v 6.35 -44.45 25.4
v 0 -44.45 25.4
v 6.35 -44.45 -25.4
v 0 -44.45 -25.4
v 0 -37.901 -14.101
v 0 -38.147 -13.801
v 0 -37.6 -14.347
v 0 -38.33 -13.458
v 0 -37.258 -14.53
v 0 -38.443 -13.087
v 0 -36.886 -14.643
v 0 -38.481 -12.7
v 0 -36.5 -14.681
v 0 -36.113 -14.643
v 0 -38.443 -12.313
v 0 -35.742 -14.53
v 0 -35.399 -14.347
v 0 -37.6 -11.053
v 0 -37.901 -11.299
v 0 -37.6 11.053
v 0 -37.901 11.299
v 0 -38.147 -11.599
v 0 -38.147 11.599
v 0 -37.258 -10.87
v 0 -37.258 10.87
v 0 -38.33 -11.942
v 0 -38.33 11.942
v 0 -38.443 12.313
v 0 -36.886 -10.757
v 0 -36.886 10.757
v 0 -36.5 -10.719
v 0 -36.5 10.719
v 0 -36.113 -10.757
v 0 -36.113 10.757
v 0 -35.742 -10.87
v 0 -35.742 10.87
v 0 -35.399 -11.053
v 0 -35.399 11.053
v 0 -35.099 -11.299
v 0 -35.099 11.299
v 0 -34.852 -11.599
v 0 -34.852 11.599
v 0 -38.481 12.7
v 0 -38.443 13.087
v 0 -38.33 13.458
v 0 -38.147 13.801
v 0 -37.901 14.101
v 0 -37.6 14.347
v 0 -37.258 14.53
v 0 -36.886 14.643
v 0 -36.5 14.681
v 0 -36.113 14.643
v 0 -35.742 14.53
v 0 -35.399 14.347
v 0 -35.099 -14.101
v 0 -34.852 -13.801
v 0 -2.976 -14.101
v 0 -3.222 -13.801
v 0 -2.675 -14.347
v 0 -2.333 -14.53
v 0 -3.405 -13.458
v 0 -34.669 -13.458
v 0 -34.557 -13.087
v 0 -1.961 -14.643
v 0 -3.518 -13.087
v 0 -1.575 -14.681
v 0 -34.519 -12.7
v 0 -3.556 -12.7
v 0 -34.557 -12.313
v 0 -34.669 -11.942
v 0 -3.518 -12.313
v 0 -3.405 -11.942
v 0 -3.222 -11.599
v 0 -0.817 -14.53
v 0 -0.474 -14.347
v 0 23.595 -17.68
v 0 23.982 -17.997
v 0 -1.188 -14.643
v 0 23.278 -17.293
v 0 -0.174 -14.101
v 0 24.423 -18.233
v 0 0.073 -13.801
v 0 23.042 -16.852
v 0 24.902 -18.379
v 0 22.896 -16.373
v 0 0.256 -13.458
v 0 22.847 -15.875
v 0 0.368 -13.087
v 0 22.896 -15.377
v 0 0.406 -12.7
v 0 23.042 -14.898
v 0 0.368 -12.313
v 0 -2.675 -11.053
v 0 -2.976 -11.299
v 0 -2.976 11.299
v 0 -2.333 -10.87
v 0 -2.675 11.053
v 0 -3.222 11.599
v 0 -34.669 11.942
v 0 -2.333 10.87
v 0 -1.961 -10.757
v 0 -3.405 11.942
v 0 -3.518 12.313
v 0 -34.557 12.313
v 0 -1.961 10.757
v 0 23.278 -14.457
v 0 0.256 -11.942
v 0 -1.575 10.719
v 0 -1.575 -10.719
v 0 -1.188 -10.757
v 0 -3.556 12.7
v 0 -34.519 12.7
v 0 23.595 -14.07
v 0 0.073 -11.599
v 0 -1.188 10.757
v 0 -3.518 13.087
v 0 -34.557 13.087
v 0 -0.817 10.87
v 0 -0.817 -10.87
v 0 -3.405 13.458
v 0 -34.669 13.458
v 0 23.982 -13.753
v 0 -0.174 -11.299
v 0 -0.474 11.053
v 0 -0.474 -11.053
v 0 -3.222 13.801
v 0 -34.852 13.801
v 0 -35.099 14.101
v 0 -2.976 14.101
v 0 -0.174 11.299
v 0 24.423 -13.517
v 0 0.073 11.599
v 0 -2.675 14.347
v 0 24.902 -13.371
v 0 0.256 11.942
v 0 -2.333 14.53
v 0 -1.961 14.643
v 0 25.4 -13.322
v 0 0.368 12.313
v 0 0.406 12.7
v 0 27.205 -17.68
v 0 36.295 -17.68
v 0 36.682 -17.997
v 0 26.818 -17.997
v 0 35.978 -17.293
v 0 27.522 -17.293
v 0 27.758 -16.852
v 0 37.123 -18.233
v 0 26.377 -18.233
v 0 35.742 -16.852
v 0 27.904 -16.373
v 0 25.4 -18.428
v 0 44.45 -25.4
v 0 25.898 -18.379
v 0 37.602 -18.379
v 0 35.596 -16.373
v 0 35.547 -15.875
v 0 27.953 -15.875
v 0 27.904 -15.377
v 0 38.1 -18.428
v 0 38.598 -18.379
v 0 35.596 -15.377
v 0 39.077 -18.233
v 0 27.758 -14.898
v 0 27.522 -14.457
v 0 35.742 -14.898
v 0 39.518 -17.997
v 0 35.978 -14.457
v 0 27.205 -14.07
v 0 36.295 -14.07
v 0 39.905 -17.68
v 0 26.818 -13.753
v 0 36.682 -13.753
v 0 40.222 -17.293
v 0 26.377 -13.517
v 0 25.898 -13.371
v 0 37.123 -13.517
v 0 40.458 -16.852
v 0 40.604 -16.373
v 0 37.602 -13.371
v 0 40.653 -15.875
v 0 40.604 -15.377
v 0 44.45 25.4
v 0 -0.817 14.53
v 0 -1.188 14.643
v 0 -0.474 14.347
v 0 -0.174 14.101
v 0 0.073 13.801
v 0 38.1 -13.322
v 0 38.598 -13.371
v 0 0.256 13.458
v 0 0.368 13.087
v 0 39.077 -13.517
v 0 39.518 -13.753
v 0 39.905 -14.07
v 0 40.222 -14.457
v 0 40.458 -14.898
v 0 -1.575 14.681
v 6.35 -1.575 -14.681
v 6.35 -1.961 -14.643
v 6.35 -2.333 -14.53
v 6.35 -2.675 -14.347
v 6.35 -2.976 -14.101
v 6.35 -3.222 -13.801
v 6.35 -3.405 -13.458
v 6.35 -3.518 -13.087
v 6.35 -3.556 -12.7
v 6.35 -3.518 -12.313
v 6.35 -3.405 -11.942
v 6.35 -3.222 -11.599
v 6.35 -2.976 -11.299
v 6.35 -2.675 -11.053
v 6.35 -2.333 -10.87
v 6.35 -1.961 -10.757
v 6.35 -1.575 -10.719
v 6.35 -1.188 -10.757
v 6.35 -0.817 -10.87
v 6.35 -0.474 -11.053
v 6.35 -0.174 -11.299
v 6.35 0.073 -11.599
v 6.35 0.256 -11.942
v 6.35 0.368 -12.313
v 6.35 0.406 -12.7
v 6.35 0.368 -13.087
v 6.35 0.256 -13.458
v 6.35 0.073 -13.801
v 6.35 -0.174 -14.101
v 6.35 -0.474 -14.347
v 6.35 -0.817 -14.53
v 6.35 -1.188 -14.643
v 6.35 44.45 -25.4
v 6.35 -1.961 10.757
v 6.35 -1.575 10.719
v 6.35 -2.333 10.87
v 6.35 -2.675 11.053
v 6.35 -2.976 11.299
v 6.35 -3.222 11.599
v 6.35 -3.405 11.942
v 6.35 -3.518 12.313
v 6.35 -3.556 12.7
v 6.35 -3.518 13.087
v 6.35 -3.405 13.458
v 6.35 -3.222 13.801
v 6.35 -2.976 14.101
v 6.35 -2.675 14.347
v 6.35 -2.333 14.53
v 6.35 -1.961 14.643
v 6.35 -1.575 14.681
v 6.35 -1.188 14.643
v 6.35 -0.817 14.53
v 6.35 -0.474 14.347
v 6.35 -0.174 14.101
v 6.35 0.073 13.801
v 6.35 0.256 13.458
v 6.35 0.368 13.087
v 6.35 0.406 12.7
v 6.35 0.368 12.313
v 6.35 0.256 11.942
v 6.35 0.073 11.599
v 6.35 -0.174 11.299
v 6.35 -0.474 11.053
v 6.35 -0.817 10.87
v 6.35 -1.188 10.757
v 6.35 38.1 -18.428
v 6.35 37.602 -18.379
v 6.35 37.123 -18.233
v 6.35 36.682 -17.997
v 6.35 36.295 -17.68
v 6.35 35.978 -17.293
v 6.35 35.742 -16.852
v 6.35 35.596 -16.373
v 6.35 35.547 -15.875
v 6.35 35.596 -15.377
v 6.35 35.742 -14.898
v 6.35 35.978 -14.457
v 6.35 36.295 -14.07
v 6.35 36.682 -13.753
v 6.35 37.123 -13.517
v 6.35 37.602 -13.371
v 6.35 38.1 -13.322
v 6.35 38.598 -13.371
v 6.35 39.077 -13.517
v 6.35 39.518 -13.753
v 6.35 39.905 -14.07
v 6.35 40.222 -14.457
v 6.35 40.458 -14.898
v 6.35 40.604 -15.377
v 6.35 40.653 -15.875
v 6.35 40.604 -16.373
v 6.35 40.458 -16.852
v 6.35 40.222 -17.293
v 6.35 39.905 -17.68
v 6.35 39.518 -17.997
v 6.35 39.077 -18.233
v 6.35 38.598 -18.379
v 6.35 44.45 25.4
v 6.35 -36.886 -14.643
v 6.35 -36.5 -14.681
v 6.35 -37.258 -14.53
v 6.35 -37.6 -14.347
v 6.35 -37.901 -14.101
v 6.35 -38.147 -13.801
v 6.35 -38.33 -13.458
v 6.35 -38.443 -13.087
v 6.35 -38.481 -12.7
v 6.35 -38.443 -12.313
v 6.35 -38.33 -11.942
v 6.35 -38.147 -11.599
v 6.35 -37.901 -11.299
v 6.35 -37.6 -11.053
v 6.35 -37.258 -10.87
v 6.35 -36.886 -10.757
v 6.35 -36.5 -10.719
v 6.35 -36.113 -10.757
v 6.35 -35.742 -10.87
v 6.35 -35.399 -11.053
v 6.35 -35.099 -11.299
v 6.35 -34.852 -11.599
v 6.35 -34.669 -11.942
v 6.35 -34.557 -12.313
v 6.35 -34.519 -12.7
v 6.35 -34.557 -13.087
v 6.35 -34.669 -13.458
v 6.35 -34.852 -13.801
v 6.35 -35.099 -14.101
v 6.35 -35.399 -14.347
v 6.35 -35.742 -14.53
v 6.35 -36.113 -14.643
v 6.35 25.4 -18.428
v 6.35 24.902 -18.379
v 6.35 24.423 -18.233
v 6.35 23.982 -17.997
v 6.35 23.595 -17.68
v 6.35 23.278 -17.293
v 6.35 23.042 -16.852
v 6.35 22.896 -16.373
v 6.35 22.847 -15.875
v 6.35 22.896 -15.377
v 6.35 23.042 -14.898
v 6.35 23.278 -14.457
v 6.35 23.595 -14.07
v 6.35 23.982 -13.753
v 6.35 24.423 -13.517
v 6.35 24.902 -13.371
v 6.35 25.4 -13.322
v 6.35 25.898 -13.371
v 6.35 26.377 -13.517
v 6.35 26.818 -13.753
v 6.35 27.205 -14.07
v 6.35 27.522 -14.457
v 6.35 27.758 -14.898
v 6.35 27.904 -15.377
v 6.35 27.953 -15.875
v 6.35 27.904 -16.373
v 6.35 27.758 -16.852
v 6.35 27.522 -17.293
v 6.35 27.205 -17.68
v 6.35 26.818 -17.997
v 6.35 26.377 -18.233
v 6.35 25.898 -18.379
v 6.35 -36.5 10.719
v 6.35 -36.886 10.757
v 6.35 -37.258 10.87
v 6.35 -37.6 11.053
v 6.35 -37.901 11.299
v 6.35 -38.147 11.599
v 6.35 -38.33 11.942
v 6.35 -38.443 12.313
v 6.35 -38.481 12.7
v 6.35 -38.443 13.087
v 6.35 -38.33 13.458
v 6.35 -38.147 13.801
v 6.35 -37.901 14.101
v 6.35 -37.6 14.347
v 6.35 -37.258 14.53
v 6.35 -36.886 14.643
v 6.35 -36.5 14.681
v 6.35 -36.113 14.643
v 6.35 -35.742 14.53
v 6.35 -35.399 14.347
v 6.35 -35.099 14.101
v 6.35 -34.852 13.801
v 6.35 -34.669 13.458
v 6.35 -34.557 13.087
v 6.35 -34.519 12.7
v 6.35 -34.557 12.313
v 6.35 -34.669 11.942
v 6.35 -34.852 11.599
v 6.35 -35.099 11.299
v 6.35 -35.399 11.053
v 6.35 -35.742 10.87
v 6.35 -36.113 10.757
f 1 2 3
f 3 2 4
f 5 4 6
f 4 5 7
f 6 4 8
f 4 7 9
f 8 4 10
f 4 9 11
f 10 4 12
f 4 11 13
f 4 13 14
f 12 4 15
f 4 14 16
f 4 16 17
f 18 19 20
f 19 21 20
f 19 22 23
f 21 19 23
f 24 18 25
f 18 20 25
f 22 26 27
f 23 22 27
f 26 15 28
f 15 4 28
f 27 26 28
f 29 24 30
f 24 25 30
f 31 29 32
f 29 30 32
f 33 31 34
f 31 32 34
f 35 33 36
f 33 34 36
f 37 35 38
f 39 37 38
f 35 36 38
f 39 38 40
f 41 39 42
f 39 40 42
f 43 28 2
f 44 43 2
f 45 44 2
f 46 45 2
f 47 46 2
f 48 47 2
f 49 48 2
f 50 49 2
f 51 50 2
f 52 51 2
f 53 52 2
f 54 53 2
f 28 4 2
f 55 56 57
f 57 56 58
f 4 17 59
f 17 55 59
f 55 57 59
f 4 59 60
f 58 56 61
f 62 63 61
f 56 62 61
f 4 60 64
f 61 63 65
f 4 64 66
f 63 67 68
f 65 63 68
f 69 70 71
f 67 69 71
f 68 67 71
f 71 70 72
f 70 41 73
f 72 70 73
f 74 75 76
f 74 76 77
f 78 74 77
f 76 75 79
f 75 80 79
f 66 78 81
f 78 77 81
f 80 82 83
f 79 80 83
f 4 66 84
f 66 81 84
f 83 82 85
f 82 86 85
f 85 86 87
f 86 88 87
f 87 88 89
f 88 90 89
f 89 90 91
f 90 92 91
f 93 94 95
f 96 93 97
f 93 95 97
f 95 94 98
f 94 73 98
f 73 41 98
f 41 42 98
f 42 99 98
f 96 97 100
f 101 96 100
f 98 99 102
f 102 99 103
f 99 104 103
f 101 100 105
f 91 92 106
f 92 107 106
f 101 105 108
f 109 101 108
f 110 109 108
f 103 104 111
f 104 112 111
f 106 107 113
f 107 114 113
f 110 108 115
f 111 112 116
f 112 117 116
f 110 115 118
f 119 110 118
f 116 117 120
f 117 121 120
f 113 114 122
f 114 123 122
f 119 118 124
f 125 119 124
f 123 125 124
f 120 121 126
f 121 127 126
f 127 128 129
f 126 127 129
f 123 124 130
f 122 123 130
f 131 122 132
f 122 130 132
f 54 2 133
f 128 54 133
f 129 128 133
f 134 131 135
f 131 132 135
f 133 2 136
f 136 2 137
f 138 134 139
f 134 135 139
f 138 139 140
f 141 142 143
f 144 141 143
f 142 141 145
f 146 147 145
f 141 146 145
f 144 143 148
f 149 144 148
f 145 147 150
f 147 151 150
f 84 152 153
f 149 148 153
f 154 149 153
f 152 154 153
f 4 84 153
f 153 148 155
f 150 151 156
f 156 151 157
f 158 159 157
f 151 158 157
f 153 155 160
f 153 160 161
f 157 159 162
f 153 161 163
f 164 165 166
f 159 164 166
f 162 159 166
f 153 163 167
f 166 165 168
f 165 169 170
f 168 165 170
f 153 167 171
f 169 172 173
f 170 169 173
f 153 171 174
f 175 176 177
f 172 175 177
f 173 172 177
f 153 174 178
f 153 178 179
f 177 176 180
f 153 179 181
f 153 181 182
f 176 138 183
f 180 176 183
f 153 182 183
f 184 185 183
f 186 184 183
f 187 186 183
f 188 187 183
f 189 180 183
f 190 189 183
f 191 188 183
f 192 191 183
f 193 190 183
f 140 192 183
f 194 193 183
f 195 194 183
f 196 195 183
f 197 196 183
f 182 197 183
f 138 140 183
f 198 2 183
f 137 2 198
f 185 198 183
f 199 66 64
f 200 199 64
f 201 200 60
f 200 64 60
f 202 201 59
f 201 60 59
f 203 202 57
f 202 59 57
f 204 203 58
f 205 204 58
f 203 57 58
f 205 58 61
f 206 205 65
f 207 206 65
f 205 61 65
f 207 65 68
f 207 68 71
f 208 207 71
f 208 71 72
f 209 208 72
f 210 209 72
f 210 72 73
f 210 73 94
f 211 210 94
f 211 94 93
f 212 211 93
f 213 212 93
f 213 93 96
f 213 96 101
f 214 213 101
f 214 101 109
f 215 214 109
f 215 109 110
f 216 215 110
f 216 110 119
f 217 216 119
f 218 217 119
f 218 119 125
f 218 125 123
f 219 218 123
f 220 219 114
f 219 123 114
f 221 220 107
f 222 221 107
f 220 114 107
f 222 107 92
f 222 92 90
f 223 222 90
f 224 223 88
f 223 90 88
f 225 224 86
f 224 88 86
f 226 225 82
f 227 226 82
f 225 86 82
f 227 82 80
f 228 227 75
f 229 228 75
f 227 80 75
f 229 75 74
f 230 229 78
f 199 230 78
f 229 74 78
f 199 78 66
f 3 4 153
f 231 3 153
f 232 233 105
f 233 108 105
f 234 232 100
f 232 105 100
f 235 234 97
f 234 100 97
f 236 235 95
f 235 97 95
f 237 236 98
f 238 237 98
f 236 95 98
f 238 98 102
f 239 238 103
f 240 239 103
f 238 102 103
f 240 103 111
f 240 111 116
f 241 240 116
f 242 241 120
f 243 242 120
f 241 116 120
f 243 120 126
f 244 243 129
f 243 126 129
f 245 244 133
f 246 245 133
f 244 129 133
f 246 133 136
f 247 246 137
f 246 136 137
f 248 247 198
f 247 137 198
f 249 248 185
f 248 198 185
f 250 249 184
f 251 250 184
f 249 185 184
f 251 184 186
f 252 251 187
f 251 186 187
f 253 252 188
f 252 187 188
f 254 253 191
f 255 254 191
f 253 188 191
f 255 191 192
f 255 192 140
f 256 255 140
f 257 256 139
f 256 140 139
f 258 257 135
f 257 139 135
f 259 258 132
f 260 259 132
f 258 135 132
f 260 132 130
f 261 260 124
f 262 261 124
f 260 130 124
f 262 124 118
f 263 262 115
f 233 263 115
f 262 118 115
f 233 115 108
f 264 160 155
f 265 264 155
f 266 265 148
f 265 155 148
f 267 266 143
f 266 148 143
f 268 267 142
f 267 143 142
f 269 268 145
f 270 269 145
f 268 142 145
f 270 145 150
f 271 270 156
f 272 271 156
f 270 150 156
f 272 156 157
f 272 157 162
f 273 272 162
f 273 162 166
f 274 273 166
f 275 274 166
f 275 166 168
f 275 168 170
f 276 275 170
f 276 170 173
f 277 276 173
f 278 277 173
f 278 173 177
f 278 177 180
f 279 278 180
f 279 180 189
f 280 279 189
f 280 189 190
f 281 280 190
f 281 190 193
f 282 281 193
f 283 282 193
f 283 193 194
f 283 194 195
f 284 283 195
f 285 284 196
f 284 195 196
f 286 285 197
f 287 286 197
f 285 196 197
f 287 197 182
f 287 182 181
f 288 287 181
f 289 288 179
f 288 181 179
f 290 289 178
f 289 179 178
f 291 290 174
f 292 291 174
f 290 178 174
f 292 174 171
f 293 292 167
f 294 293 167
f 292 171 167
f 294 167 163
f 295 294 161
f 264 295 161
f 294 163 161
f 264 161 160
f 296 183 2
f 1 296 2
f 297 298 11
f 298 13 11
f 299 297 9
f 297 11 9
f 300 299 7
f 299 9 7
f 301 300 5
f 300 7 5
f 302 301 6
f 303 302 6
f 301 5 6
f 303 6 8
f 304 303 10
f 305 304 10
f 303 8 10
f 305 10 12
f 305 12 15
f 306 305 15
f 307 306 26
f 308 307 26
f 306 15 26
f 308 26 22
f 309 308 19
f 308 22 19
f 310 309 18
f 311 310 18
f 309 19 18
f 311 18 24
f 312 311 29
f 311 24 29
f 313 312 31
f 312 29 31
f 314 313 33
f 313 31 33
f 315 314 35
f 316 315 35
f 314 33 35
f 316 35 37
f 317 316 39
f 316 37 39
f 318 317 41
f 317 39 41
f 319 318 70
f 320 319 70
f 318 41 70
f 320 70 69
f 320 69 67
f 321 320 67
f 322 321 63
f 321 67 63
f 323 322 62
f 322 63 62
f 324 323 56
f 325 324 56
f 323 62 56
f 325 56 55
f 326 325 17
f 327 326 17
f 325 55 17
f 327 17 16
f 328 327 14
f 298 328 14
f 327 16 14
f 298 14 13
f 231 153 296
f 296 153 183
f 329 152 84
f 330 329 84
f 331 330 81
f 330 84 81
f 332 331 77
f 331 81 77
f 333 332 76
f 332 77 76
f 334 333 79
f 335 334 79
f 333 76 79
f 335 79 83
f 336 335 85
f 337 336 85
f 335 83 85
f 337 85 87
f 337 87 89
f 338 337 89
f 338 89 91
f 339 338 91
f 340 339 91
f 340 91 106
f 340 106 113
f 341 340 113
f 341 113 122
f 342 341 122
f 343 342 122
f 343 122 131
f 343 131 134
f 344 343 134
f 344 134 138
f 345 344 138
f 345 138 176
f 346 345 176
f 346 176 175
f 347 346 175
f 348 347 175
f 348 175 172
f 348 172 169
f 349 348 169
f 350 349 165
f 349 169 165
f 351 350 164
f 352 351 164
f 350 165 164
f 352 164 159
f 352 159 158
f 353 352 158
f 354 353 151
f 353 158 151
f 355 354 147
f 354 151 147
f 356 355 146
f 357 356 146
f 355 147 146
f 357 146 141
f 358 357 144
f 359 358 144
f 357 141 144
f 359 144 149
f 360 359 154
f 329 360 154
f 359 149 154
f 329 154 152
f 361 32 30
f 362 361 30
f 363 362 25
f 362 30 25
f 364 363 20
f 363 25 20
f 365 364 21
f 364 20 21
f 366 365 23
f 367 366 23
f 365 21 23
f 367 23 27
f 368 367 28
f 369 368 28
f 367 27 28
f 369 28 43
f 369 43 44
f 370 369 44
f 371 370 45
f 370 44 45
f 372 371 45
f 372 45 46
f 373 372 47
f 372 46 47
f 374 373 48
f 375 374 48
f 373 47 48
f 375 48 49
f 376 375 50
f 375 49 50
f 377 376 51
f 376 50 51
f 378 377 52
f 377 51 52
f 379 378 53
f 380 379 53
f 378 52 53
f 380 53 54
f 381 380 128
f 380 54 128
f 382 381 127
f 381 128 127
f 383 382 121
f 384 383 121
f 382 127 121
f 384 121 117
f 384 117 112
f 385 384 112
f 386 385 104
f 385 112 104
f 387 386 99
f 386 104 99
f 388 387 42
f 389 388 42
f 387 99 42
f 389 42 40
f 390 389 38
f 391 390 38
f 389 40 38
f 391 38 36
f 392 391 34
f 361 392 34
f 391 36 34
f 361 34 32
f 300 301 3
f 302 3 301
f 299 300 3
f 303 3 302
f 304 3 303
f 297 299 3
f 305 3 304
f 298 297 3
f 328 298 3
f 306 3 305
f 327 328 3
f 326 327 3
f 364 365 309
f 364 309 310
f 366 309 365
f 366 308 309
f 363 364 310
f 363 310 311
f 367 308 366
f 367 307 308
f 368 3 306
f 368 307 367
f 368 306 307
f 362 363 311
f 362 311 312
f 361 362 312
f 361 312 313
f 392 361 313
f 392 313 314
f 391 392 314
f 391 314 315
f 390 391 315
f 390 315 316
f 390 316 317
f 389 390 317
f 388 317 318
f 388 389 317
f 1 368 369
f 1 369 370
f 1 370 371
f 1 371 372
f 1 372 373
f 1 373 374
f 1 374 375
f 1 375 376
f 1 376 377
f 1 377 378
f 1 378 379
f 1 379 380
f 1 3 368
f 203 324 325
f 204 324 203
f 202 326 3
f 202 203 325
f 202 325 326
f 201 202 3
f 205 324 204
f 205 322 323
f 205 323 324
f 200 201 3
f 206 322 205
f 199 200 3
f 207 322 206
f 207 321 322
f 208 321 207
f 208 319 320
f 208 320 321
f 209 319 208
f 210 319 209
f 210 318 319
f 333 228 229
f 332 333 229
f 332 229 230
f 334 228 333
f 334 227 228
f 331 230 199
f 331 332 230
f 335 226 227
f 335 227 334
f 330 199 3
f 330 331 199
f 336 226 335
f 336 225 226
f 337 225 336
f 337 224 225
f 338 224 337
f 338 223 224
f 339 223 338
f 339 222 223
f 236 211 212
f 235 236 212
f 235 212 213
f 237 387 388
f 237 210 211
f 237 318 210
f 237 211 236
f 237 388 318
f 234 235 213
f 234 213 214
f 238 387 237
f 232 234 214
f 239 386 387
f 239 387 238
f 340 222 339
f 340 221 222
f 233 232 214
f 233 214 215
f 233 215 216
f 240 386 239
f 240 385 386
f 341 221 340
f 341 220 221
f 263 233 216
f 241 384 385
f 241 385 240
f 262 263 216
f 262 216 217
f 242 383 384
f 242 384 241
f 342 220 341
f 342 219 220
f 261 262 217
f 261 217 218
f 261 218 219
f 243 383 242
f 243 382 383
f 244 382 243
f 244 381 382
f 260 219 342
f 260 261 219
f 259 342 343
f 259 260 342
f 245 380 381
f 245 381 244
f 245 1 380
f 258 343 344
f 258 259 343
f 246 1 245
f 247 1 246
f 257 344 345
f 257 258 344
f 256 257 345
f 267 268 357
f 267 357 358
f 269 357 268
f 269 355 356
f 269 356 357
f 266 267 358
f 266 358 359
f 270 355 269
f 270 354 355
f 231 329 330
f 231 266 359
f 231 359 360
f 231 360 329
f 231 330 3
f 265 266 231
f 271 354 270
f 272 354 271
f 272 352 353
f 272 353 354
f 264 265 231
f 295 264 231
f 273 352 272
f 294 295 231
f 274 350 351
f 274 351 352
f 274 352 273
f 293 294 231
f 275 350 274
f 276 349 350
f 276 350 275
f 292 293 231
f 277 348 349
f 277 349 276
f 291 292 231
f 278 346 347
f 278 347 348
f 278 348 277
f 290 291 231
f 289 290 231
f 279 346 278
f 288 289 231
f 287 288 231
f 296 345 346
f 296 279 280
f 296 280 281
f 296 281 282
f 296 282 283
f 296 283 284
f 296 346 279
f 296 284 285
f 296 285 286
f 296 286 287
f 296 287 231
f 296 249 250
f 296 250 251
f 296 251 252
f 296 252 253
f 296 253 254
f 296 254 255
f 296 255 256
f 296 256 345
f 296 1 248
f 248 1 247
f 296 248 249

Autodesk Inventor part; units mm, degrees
ref_plane "YZ Plane" through (0, 0, 0) normal (1, 0, 0) x (0, 1, 0)
ref_plane "XZ Plane" through (0, 0, 0) normal (0, 1, 0) x (-1, 0, 0)
ref_plane "XY Plane" through (0, 0, 0) normal (0, 0, 1) x (1, 0, 0)
sketch "Sketch1" plane through (0, 0, 0) normal (1, 0, 0) x (0, 1, 0)
  line L0 (-44.45, -25.4) -> (44.45, -25.4)
  line L1 (44.45, -25.4) -> (44.45, 25.4)
  line L2 (44.45, 25.4) -> (-44.45, 25.4)
  line L3 (-44.45, 25.4) -> (-44.45, -25.4)
  line L4 (-44.45, -25.4) -> (44.45, 25.4) construction
  line L5 (44.45, -25.4) -> (-44.45, 25.4) construction
  point P0 (0, 0)
  dimension "d0" = 88.9
  dimension "d1" = 50.8
extrude "Extrusion1" add sketch "Sketch1" along normal blind 6.35
sketch "Sketch2" plane through (6.35, 0, 0) normal (1, 0, 0) x (0, 0, -1)
  line L0 (12.7, -36.4998) -> (-12.7, -36.4998) construction
  line L1 (-12.7, -36.4998) -> (-12.7, -1.5748) construction
  line L2 (-12.7, -1.5748) -> (12.7, -1.5748) construction
  line L3 (12.7, -1.5748) -> (12.7, -36.4998) construction
  line L4 (12.7, -36.4998) -> (-12.7, -1.5748) construction
  line L5 (-12.7, -36.4998) -> (12.7, -1.5748) construction
  line L6 (-25.4, -44.45) -> (25.4, -44.45) construction
  line L7 (25.4, 44.45) -> (-25.4, 44.45) construction
  line L8 (25.4, -44.45) -> (25.4, 44.45) construction
  point P0 (0, 0)
  point P1 (0, -19.0373)
  point P2 (15.875, 38.1)
  point P3 (15.875, 25.4)
  point P4 (0, 44.45)
  point P5 (0, 44.45)
  dimension "d4" = 25.4
  dimension "d5" = 34.925
  dimension "d6" = 7.9502
  dimension "d7" = 12.7
  dimension "d23" = 6.35
  dimension "d24" = 9.525
hole "Hole1" at (6.35, -36.4998, 12.7) at (6.35, -36.4998, -12.7) at (6.35, -1.5748, -12.7) at (6.35, -1.5748, 12.7) direction (-1, 0, 0) diameter 3.9624 end through all thread size "10-32 UNF" class "2B" standard "ANSI Unified Screw Threads"
hole "Hole2" at (6.35, 38.1, -15.875) at (6.35, 25.4, -15.875) direction (-1, 0, 0) diameter 5.1054 end through all clearance for "Flat Head Machine Screw (82)" size "#10" standard "Ansi Unified Screw Threads"
properties part number "EL2-027" material "Aluminum 6061"
